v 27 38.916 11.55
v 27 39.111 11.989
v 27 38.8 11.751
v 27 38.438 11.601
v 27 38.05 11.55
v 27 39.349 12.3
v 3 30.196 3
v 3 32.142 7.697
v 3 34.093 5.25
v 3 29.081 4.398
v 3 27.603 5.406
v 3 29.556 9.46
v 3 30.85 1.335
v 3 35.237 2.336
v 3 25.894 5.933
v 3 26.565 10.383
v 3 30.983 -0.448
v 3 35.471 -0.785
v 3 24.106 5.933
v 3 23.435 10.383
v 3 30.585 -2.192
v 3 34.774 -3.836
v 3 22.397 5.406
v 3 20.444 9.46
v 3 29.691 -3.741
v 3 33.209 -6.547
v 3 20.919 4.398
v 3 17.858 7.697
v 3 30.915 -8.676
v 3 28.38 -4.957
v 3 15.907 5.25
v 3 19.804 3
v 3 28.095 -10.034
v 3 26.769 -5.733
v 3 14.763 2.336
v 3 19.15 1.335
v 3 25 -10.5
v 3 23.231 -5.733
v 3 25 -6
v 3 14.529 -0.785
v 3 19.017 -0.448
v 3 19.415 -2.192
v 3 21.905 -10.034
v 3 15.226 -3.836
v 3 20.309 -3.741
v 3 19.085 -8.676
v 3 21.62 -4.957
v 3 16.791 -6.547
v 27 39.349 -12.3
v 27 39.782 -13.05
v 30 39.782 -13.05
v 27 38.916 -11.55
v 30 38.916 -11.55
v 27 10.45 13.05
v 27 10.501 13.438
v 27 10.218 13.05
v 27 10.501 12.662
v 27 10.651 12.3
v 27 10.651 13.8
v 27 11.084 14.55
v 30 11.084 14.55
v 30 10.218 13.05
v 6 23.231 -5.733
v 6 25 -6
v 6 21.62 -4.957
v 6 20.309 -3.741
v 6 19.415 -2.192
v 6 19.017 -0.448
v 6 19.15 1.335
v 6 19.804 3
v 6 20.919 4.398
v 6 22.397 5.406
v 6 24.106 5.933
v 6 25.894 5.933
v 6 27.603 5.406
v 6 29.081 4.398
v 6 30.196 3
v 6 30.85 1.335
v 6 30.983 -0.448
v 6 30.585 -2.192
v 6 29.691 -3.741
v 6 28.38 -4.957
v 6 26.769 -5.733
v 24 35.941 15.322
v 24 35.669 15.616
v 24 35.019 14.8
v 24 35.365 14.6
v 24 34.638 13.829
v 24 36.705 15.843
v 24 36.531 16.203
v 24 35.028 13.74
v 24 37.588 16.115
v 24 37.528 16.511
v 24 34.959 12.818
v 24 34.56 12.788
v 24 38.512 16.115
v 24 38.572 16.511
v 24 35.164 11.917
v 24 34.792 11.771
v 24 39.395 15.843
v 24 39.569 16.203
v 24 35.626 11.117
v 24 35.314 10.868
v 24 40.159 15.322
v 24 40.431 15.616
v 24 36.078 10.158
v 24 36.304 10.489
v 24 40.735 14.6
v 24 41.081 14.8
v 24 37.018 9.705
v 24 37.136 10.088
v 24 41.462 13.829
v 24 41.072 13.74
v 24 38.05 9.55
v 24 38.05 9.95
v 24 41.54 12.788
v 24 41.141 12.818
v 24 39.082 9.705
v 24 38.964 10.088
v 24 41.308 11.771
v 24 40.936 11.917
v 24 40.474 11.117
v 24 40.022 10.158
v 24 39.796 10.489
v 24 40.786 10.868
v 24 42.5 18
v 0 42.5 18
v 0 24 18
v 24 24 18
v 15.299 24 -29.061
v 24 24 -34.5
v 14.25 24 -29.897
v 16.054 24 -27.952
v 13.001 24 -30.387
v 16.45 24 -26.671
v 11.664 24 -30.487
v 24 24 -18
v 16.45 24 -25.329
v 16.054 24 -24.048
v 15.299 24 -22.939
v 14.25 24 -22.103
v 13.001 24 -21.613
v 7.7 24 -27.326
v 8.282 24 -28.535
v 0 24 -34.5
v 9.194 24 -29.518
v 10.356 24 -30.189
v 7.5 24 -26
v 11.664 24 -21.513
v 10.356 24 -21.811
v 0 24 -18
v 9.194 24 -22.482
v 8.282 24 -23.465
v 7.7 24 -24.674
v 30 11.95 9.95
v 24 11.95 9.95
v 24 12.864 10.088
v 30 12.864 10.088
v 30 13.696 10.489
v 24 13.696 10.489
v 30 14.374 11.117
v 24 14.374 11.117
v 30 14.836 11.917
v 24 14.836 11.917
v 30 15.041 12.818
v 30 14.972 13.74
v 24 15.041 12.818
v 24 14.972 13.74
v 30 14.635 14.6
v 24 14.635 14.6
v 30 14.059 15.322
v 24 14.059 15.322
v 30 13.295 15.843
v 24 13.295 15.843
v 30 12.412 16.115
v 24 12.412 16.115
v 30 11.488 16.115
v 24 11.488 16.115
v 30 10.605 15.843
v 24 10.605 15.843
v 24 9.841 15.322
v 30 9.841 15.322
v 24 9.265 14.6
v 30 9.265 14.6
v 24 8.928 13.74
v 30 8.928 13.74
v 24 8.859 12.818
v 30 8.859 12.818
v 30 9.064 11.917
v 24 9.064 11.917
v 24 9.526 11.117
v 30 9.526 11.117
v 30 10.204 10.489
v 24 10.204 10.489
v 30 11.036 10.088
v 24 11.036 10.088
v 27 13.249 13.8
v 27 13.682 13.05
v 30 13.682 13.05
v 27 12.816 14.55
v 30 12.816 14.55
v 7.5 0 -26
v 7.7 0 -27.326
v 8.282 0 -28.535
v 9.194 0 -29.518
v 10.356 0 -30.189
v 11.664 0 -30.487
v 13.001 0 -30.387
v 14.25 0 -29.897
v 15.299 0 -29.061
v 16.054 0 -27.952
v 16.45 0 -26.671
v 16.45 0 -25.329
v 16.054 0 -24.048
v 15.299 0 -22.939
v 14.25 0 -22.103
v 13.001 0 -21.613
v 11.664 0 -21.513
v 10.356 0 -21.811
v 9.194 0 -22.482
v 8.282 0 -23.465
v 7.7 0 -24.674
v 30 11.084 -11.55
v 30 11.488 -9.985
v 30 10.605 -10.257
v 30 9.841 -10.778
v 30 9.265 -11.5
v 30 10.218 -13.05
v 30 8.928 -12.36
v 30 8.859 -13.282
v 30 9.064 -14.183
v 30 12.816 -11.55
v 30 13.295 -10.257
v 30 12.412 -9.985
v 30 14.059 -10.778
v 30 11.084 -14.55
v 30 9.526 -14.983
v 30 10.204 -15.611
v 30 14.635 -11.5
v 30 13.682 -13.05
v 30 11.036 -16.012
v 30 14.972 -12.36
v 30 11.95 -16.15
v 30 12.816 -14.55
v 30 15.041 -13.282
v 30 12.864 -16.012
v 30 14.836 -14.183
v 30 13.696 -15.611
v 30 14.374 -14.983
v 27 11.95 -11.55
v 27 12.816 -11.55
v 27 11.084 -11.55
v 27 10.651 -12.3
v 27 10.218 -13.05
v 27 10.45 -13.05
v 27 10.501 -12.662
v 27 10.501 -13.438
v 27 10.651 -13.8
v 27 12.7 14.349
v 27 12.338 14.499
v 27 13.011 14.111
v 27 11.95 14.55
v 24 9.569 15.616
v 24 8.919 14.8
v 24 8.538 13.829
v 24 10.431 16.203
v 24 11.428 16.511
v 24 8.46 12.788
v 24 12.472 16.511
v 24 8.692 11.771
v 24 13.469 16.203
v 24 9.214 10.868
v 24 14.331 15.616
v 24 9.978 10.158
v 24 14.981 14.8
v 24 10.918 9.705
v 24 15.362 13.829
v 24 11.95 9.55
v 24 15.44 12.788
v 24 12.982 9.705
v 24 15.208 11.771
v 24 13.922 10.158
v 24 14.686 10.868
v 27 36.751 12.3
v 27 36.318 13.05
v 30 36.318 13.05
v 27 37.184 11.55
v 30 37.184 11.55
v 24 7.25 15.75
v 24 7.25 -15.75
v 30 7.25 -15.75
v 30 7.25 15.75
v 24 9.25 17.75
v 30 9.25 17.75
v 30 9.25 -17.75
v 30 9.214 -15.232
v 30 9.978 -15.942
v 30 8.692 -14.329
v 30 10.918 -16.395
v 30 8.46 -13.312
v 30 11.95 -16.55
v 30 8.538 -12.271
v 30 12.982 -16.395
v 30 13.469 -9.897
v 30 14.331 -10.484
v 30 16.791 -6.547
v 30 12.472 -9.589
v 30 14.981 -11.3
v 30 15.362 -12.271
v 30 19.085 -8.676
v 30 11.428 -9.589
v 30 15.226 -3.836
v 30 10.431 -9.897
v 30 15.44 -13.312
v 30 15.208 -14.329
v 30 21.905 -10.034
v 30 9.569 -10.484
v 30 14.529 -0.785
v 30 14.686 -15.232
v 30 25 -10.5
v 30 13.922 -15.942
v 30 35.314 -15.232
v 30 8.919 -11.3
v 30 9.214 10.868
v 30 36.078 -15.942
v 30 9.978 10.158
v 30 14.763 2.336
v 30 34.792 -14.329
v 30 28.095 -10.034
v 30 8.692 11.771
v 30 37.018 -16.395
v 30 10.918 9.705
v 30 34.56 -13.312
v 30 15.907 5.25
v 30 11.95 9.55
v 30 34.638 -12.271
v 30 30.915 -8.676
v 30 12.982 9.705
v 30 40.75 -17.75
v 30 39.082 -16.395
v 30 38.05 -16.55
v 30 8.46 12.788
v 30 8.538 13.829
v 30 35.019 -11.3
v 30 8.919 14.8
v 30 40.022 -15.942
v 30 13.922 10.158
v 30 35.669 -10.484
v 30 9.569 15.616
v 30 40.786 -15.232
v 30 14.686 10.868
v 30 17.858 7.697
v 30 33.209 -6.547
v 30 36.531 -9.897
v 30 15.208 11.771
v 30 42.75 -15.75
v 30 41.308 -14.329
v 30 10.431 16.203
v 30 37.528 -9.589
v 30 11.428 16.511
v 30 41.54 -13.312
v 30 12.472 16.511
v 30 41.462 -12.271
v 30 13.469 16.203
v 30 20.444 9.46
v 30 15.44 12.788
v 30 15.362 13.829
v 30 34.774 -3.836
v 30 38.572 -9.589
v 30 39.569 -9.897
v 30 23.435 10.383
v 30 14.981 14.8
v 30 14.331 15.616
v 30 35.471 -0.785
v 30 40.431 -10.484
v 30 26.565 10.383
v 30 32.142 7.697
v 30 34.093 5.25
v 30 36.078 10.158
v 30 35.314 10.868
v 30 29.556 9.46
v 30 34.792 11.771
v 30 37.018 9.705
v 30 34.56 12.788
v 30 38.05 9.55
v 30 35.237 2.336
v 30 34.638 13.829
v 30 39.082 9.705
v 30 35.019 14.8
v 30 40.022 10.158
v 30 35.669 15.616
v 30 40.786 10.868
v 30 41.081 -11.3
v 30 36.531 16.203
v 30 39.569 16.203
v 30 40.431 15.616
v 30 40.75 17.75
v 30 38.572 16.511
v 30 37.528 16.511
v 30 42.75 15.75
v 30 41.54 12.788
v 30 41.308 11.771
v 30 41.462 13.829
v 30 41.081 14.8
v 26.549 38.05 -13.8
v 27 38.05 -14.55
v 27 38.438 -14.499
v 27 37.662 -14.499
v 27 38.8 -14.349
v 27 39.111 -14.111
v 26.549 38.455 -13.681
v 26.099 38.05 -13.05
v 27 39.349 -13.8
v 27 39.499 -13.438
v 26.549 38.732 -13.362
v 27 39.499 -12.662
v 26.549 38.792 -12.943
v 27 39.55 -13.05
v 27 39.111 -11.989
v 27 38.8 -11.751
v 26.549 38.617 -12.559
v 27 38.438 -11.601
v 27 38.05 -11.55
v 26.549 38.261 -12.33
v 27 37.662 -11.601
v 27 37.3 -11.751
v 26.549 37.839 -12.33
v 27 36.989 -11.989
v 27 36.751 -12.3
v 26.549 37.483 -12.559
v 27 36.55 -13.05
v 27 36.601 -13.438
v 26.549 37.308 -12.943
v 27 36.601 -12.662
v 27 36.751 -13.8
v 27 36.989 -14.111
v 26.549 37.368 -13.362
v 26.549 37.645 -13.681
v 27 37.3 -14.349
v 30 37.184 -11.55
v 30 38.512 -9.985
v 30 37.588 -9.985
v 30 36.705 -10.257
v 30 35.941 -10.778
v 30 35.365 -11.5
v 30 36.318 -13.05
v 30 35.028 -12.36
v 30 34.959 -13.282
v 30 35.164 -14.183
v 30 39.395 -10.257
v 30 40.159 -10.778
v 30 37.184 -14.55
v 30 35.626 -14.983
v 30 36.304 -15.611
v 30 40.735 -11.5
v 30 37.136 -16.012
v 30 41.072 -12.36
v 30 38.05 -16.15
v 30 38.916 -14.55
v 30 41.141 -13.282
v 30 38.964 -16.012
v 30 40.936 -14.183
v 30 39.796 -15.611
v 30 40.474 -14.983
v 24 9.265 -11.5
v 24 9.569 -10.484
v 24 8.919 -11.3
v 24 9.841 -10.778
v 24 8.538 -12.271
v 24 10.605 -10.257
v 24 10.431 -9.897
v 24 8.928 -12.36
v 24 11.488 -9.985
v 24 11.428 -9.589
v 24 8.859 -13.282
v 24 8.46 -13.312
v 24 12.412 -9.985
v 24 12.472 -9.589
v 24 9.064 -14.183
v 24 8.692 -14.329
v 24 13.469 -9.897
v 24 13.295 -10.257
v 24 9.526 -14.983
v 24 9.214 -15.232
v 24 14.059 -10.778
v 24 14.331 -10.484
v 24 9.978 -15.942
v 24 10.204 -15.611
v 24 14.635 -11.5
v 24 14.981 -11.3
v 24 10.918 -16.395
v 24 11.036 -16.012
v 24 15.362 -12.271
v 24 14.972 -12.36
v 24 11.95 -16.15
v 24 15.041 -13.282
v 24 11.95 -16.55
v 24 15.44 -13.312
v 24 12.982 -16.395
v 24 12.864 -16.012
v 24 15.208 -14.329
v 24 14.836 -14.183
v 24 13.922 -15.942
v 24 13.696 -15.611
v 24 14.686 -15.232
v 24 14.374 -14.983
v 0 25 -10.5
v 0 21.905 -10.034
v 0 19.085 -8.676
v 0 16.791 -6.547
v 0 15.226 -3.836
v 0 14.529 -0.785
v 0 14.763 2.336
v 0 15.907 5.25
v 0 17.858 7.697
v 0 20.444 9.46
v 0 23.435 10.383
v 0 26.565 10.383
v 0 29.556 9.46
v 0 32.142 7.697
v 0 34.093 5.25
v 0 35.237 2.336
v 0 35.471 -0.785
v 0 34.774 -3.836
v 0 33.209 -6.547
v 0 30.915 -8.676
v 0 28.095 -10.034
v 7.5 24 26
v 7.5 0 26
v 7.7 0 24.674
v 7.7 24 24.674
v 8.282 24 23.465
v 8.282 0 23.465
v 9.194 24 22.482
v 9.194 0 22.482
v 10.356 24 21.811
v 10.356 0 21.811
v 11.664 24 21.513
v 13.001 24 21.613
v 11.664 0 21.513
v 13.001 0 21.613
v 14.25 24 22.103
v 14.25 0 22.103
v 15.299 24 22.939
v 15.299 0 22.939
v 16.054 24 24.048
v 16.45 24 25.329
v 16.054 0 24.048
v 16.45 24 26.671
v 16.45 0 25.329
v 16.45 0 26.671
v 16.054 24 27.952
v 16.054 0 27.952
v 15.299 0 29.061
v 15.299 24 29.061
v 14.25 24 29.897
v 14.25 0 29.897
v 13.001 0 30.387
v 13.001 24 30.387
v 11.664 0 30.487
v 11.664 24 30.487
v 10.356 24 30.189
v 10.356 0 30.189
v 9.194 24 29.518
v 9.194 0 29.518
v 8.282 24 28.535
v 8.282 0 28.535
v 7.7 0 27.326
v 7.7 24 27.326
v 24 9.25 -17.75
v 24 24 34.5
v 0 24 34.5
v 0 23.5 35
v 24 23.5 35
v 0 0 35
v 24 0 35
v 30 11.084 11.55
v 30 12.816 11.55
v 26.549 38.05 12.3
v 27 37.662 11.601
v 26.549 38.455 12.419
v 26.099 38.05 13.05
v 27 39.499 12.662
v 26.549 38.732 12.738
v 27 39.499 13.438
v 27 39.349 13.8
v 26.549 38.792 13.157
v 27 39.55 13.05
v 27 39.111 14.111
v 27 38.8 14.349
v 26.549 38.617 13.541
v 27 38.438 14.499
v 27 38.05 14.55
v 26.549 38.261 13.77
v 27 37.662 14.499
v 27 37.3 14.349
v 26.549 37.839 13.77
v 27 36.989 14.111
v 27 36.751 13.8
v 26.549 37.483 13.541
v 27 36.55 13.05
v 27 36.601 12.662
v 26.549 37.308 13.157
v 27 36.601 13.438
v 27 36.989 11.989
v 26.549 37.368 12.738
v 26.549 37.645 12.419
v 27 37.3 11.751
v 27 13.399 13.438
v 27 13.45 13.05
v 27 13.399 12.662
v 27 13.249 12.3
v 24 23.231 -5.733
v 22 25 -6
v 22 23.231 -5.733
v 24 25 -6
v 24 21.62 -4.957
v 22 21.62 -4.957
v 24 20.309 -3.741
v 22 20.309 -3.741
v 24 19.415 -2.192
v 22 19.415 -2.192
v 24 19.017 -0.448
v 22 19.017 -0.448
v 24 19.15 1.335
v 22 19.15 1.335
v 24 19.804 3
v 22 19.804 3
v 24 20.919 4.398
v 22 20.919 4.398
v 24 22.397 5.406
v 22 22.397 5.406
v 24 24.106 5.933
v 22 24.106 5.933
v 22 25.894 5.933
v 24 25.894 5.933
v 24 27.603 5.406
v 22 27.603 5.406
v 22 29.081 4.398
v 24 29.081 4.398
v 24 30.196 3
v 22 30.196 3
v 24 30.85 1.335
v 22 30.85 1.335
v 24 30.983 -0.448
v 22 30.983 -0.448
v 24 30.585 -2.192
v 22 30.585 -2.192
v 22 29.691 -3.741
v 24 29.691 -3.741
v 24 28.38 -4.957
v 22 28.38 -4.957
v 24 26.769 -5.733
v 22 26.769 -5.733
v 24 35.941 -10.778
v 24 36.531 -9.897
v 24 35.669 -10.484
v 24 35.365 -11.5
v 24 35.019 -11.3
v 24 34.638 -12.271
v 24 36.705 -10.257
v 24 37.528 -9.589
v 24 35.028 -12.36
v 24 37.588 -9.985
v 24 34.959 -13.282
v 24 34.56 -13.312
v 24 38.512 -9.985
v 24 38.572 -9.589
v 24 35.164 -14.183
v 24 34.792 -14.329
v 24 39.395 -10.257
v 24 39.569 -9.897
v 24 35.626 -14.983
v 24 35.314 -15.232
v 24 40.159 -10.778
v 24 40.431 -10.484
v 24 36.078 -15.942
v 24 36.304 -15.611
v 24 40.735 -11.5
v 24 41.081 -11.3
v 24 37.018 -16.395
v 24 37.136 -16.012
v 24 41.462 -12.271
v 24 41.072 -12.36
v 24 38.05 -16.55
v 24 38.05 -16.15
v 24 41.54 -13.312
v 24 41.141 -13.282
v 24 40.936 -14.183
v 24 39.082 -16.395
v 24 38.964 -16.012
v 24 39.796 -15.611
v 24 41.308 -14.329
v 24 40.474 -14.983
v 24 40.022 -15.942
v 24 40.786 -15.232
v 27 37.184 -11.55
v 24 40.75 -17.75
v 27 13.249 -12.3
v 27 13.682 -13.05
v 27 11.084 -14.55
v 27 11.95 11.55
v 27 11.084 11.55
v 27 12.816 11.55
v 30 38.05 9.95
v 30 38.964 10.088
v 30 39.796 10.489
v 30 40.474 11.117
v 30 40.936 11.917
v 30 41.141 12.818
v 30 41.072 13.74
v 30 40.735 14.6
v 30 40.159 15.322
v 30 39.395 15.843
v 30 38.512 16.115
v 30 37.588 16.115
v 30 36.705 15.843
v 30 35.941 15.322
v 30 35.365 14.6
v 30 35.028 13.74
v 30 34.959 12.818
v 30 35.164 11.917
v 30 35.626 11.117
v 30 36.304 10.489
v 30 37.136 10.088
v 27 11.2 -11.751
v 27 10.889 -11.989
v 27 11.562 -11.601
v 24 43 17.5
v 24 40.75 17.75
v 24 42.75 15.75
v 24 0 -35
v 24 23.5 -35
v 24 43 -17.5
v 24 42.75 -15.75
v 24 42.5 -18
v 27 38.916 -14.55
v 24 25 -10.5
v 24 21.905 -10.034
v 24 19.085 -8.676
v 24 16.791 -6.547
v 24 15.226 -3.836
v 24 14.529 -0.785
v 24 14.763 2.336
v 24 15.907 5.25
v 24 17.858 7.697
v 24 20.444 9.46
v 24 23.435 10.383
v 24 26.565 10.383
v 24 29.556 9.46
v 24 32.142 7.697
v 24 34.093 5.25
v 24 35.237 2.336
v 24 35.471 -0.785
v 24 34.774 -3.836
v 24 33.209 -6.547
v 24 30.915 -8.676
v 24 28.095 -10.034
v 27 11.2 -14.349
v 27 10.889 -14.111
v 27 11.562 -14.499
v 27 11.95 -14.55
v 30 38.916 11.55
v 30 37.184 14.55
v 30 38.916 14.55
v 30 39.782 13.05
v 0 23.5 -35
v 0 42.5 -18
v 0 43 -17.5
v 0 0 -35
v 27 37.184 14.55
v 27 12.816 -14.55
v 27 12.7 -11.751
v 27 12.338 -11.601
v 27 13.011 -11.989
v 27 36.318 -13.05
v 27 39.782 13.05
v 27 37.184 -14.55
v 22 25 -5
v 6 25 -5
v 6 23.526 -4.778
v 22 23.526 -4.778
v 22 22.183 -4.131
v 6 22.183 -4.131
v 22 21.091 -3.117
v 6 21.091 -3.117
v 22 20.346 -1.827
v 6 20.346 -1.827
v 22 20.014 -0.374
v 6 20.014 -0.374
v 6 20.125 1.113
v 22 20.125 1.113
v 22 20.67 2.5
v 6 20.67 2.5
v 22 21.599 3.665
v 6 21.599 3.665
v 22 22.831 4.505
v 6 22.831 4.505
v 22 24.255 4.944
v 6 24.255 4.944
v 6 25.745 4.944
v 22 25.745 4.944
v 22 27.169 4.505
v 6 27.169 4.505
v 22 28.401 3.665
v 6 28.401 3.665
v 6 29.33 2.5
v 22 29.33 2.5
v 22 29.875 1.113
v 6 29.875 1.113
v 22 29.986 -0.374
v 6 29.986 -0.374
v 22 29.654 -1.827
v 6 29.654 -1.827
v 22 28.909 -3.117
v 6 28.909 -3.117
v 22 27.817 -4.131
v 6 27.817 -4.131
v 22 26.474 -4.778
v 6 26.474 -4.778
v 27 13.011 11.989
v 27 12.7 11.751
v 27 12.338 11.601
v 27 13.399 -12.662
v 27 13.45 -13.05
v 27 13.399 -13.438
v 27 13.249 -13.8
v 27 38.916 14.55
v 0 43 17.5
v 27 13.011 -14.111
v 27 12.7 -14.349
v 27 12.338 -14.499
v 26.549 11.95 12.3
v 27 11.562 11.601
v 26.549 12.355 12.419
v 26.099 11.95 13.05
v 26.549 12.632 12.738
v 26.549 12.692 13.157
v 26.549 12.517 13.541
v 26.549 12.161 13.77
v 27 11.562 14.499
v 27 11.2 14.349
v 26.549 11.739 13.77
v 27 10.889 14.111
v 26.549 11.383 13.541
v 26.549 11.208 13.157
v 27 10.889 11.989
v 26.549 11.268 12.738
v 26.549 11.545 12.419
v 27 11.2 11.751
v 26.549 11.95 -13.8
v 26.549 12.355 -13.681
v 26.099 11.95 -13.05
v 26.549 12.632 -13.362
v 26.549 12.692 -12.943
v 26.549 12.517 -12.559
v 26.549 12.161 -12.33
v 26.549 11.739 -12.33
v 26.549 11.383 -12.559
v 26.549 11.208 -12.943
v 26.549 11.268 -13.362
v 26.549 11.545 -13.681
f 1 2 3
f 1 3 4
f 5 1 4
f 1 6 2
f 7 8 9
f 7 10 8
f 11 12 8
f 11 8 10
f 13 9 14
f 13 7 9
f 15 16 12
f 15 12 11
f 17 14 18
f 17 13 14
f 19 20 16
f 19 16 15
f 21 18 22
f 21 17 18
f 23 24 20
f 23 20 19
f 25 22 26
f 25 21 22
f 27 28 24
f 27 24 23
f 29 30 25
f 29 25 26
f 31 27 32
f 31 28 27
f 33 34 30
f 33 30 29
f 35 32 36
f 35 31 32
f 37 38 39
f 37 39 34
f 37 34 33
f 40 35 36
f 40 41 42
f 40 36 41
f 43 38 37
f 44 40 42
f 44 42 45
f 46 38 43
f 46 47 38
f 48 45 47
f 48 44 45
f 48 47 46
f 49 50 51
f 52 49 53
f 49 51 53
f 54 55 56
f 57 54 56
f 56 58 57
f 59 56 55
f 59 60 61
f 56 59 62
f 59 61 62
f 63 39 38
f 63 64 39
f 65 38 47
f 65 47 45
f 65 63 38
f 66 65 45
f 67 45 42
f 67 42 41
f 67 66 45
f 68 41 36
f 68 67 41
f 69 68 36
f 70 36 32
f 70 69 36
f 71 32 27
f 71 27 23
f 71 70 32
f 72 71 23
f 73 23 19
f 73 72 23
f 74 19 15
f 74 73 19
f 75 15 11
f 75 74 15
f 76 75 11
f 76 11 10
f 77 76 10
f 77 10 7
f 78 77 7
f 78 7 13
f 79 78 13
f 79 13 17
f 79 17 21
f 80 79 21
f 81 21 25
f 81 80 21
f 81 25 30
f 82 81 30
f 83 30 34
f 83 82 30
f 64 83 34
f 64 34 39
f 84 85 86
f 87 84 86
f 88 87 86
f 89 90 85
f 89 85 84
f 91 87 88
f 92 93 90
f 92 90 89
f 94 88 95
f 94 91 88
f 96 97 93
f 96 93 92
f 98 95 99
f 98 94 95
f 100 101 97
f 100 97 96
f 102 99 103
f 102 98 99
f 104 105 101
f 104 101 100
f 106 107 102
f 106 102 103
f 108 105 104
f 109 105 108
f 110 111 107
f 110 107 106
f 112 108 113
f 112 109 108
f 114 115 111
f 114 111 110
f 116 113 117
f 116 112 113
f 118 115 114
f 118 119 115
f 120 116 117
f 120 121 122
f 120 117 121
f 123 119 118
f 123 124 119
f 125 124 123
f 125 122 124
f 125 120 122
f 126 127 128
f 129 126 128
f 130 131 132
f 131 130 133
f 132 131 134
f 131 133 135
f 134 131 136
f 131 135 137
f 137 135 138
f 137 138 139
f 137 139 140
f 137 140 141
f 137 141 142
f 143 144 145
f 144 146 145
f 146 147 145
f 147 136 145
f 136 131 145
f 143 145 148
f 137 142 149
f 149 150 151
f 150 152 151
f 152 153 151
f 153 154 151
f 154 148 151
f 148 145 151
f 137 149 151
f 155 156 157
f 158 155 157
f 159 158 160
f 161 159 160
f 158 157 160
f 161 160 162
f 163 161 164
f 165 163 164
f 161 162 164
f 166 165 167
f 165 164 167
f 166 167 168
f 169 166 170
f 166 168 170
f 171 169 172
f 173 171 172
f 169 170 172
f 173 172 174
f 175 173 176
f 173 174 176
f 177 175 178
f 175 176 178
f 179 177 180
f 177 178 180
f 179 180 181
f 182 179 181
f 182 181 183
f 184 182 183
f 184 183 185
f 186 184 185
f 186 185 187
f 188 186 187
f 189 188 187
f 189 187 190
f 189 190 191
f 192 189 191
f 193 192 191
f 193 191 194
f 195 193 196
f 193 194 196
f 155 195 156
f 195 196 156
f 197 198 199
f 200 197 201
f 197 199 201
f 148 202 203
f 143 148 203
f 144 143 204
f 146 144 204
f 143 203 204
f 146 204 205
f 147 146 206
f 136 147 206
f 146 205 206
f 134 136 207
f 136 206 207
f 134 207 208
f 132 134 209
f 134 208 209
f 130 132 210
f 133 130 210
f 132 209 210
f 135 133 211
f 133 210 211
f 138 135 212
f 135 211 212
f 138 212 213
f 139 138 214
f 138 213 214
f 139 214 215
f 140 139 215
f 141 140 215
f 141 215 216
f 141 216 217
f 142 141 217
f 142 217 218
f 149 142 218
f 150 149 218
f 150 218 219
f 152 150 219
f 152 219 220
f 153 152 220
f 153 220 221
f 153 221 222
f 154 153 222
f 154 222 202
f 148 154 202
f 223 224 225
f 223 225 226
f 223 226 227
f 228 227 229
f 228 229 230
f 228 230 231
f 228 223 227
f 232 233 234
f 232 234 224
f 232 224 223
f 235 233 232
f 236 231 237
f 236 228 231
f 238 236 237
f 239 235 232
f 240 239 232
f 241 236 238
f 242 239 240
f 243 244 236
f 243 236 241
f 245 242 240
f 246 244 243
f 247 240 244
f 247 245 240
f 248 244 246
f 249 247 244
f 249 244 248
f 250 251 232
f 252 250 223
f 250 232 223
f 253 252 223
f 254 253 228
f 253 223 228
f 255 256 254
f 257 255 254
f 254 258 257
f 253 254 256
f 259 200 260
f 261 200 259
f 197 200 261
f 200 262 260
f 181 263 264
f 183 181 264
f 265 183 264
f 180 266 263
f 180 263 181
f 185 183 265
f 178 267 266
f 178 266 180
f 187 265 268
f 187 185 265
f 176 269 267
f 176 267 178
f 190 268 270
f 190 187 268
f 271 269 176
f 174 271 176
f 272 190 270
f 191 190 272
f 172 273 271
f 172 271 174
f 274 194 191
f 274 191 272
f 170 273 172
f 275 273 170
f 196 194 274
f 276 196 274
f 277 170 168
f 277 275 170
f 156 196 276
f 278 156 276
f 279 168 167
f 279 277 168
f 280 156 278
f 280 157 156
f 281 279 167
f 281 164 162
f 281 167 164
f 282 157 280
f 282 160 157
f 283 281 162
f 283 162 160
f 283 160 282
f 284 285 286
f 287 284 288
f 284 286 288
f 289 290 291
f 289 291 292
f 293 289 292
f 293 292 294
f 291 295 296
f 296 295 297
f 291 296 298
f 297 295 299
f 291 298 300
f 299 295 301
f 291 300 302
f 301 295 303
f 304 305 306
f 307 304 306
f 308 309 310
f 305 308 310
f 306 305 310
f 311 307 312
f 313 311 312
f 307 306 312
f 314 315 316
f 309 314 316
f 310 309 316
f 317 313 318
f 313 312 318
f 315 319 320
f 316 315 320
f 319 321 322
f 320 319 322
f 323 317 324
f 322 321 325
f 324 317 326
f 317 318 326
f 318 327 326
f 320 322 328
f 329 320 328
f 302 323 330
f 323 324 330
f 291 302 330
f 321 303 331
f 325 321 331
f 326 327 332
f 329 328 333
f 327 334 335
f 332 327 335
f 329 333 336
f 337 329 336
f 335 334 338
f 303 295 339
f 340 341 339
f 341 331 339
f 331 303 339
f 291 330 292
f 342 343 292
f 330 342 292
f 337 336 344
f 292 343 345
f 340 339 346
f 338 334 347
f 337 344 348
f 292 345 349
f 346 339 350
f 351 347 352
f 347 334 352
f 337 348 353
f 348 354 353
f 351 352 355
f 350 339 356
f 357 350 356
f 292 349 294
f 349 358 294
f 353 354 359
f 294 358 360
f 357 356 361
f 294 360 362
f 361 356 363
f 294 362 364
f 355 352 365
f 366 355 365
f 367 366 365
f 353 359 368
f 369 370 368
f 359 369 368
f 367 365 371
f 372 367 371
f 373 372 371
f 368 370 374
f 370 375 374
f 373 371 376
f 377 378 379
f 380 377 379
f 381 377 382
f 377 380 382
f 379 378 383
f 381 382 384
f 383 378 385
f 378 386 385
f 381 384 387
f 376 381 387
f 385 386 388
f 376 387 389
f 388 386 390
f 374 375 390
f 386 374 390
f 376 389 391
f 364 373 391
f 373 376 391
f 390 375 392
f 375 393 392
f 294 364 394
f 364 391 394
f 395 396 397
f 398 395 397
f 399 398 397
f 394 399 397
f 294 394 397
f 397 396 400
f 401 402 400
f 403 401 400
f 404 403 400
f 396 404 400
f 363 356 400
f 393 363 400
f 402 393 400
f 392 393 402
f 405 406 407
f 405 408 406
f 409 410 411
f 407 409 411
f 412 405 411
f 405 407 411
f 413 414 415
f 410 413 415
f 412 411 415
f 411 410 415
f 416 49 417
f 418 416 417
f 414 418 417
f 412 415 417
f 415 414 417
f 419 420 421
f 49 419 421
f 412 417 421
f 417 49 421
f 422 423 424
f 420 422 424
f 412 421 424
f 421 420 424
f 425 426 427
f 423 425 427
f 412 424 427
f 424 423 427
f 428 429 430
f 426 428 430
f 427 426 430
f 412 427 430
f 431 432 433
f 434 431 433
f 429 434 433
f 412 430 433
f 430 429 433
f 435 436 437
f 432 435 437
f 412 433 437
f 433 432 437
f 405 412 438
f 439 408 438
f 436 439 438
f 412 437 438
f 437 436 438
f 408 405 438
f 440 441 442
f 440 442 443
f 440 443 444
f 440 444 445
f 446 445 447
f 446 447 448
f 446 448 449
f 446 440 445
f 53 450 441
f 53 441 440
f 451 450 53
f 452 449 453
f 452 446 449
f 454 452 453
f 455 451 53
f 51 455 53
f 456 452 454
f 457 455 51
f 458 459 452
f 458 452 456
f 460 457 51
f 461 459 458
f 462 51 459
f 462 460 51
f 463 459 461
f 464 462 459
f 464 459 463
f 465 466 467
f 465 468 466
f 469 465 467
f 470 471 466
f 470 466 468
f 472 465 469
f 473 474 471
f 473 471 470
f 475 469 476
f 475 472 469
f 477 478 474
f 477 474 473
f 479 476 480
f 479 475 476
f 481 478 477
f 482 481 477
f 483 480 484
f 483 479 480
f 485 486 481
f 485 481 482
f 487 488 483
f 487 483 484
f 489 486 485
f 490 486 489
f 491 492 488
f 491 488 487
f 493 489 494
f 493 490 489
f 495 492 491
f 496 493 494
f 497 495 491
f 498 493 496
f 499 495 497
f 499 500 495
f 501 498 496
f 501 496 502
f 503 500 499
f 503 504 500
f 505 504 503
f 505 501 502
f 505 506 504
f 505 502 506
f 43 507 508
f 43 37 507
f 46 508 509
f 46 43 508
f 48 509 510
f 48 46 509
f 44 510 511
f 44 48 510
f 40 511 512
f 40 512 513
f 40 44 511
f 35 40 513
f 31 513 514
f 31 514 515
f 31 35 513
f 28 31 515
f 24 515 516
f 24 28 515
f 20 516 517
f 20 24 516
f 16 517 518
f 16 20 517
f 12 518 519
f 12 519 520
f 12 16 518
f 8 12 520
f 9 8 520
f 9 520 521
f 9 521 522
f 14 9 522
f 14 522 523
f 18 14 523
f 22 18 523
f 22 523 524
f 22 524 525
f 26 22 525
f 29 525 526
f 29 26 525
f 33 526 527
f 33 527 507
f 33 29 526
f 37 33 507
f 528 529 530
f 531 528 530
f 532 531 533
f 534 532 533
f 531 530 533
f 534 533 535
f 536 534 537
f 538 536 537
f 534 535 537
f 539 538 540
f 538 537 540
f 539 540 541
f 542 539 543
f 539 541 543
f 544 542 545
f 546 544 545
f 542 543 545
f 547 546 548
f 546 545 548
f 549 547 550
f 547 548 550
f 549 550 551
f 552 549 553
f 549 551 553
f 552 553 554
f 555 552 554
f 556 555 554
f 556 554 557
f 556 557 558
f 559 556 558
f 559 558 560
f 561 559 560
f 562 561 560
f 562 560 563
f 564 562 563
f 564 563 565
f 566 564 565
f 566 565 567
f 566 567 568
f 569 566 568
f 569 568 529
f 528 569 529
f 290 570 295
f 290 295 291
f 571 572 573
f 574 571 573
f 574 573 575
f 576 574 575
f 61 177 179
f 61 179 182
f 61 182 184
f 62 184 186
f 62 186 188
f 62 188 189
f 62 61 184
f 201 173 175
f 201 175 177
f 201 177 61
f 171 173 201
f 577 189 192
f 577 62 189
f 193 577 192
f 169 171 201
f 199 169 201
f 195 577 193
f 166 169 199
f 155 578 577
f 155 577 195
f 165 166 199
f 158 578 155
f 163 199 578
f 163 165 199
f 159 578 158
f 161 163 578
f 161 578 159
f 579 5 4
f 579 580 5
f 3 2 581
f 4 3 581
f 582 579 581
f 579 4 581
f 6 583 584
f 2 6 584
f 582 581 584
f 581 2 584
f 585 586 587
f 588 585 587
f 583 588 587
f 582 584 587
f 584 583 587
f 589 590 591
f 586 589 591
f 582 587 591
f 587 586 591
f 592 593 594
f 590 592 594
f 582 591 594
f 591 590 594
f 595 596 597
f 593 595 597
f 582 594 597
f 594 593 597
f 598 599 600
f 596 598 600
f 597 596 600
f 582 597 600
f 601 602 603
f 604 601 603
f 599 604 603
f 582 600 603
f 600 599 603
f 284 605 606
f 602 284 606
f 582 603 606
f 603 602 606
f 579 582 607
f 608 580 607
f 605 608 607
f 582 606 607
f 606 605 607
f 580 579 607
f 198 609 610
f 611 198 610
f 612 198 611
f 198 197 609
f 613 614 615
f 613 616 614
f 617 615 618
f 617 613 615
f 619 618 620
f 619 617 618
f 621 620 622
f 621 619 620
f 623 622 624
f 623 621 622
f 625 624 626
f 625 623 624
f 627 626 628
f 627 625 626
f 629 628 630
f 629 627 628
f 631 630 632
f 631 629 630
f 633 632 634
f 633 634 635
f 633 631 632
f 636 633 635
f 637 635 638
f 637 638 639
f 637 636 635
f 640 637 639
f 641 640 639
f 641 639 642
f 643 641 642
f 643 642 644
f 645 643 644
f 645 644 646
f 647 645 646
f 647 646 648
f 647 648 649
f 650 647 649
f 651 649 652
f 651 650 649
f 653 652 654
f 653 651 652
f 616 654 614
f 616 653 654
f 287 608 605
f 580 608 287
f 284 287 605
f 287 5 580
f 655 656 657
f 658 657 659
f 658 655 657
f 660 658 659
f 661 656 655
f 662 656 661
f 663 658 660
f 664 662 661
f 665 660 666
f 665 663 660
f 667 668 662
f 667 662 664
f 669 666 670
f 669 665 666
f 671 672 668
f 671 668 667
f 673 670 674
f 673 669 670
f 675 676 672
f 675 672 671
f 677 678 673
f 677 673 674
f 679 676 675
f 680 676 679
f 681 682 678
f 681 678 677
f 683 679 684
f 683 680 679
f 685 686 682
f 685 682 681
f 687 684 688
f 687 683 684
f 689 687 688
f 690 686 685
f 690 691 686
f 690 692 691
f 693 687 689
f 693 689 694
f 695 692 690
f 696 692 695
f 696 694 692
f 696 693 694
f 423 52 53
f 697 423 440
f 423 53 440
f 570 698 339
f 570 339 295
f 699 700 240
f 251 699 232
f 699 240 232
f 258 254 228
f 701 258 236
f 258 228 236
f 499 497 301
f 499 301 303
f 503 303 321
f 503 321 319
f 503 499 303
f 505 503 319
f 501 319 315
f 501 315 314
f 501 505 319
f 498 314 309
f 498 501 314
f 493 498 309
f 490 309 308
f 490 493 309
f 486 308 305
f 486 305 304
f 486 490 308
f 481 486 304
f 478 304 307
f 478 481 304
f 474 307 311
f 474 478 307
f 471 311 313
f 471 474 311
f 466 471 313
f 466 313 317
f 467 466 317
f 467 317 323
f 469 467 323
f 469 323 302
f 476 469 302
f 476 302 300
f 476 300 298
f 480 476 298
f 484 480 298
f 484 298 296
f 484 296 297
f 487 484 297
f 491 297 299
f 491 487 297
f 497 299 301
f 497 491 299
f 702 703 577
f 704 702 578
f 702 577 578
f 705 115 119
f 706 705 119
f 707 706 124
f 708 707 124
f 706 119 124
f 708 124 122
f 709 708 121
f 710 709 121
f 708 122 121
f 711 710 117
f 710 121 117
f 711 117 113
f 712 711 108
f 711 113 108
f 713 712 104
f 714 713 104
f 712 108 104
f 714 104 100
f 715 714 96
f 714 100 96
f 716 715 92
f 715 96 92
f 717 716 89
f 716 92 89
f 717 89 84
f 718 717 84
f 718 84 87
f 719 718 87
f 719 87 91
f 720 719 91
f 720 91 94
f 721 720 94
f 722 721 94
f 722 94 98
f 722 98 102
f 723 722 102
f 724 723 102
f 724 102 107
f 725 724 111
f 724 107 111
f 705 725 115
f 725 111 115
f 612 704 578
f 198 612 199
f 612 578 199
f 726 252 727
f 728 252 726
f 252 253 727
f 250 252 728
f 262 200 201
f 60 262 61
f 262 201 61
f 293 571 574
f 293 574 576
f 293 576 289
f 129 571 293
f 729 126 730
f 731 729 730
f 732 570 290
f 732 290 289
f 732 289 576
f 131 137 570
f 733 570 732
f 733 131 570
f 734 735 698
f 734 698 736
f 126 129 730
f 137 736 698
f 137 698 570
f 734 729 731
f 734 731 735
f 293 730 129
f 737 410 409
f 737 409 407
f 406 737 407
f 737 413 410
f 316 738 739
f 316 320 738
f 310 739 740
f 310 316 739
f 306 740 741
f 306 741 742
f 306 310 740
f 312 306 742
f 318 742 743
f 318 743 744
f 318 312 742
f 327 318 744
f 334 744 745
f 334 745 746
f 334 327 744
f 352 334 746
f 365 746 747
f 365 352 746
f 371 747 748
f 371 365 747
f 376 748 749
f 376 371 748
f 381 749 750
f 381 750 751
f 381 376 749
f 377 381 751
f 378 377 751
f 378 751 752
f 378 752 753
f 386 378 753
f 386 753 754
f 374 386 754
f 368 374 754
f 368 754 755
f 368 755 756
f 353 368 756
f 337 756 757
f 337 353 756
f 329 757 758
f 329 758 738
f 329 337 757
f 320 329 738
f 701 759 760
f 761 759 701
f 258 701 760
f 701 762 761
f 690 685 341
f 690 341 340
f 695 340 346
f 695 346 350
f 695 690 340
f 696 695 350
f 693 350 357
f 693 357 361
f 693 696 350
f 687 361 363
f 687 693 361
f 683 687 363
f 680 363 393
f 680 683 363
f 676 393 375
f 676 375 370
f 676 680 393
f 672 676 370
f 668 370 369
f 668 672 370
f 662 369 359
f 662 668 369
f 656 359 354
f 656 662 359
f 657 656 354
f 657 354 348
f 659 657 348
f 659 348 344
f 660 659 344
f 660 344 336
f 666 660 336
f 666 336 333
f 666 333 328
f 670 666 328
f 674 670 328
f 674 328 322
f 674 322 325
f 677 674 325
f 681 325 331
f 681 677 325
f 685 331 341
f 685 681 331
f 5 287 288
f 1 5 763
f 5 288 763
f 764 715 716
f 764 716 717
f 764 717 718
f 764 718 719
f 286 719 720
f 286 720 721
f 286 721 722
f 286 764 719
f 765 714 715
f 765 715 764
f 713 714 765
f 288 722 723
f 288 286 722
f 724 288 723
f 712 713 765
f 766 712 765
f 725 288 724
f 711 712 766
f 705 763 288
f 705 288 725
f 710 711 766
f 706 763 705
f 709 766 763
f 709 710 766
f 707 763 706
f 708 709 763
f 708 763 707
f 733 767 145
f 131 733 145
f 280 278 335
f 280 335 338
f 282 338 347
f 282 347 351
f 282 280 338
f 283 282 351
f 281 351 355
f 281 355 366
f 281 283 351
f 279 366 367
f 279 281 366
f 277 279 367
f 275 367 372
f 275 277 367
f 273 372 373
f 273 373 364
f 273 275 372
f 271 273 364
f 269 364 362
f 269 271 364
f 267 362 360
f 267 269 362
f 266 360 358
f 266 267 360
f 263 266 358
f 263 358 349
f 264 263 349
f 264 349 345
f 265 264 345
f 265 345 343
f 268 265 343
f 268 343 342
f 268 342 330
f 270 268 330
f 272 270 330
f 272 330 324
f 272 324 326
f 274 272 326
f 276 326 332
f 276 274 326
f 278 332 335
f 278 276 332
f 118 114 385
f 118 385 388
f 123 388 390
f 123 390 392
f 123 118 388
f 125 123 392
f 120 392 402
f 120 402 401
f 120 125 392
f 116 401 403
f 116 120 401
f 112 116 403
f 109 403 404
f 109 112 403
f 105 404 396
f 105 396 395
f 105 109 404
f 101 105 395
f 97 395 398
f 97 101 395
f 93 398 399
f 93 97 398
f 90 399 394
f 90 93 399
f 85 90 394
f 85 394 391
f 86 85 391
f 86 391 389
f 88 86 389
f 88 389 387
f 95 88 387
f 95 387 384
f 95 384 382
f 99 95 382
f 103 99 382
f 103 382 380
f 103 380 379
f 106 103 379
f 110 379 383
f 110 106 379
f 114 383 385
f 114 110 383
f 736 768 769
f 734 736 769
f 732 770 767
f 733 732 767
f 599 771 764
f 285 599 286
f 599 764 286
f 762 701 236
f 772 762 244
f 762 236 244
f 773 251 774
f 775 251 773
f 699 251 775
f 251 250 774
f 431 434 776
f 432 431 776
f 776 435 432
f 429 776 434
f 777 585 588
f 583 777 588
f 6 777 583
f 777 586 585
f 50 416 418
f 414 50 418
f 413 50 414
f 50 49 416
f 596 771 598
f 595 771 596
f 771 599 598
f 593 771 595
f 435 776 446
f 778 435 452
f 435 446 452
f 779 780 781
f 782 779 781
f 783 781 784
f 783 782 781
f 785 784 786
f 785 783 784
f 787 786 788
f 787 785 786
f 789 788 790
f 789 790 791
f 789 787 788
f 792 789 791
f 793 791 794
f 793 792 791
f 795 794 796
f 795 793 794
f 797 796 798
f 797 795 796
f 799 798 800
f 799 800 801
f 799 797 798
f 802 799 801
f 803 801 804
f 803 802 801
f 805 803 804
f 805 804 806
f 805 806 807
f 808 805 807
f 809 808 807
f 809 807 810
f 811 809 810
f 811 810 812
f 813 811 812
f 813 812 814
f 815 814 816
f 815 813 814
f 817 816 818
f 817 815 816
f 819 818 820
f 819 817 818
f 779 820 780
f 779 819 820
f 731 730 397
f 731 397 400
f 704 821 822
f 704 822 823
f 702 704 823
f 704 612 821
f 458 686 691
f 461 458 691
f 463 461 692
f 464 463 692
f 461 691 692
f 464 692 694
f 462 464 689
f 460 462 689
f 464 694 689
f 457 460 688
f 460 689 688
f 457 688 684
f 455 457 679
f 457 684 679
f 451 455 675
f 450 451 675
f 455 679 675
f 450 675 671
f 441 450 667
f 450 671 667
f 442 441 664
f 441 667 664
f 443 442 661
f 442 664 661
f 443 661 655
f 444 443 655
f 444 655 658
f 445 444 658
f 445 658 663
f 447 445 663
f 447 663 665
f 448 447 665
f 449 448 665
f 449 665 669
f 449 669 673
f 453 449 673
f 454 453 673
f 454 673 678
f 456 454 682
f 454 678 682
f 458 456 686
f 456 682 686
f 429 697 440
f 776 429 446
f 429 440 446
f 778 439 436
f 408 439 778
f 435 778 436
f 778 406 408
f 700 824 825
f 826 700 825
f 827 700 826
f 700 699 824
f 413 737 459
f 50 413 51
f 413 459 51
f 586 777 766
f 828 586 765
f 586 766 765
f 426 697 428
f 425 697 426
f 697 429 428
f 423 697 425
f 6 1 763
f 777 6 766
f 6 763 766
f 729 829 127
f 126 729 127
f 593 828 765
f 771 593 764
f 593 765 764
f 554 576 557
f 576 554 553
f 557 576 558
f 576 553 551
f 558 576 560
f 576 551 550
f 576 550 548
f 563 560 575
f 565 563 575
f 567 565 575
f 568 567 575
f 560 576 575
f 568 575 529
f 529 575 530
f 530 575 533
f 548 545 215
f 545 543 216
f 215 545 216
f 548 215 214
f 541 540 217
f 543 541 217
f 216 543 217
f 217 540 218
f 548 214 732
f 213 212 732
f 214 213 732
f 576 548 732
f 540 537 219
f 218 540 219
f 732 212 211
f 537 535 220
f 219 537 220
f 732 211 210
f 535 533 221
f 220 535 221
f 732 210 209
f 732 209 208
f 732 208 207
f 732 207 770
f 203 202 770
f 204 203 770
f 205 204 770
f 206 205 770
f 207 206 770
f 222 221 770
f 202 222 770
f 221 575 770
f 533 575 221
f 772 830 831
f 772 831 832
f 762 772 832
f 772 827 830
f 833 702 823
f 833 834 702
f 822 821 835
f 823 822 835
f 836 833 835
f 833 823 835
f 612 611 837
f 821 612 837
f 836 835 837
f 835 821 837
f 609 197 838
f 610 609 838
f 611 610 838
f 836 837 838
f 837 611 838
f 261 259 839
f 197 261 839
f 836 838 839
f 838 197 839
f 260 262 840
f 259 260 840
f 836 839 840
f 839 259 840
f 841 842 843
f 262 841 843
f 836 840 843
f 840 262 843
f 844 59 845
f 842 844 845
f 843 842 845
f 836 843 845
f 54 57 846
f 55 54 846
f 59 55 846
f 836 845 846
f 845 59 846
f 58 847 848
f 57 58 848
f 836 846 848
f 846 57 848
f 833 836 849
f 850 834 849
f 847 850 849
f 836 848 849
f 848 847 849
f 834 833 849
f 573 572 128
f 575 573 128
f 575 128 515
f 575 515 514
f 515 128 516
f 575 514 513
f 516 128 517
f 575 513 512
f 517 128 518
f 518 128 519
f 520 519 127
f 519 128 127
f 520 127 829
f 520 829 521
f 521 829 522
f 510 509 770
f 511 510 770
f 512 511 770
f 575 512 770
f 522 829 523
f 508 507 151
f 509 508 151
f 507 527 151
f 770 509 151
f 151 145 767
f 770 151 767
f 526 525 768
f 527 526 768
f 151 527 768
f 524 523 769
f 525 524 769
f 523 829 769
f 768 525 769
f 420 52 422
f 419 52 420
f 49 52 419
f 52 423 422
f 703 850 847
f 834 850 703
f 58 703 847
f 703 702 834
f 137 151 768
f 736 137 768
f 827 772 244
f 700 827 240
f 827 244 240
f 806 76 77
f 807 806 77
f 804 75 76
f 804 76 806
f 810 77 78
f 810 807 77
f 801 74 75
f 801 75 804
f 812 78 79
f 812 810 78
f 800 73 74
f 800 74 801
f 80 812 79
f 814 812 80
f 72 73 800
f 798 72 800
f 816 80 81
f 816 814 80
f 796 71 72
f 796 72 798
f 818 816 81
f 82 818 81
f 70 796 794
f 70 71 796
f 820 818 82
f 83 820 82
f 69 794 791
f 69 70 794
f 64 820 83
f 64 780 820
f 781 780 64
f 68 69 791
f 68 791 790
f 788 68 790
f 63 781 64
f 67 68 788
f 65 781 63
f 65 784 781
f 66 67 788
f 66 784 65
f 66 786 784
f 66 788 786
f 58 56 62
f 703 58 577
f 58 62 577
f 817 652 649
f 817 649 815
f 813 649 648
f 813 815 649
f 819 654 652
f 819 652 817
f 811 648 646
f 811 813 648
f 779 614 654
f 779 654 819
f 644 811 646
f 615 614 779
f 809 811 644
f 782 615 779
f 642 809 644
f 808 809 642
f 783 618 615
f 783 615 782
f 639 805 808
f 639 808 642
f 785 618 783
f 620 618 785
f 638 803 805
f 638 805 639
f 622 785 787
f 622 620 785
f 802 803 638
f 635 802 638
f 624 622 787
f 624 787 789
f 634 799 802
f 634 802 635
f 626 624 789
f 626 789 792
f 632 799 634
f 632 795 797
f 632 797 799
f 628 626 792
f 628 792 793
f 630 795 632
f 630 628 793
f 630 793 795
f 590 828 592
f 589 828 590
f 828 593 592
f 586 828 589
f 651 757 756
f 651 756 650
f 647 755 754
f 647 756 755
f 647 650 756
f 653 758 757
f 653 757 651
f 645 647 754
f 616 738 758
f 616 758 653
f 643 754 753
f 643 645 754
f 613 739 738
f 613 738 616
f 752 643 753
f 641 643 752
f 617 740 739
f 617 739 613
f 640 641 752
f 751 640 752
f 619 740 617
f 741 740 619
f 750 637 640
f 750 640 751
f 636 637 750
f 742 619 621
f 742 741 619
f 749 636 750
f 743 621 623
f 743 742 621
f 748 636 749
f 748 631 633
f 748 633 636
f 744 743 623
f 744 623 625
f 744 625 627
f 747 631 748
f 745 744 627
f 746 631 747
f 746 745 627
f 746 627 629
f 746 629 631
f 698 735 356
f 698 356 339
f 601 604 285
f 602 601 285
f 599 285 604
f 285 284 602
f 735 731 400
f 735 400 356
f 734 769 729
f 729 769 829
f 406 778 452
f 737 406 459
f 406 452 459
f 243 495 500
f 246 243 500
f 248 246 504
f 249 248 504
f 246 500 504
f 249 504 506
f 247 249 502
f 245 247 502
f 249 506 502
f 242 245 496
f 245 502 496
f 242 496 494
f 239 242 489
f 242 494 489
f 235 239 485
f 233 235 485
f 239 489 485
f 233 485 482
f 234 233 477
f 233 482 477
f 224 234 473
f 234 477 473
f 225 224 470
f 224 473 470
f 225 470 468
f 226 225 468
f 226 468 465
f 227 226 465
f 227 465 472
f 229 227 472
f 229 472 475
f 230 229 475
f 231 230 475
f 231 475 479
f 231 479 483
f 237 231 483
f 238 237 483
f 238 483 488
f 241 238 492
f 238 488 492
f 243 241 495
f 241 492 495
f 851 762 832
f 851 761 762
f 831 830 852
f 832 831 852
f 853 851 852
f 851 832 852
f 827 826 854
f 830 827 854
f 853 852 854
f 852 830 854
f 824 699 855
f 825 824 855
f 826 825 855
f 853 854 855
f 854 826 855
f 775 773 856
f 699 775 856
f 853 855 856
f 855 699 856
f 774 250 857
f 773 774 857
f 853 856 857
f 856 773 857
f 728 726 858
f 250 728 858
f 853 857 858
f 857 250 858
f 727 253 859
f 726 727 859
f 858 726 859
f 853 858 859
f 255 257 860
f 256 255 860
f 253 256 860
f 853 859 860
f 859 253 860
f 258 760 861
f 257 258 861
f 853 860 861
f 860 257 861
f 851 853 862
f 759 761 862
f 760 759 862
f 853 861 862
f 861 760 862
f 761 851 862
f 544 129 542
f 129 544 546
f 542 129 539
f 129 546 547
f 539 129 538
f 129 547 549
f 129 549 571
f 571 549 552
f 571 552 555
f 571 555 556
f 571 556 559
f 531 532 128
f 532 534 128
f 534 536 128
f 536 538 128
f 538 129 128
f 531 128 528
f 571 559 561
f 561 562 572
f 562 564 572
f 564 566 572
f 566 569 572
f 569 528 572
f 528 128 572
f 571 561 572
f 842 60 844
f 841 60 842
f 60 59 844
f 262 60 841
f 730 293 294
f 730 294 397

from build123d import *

# Parameters (mm, degrees)
BOSS_EXTRUDE1_DEPTH = 24
SKETCH4_R           = 3.5
BOSS_EXTRUDE2_DEPTH = 6
SKETCH5_R           = 3.1
BOSS_EXTRUDE3_DEPTH = 6
DIAMETERHOLE1_D     = 3
DIAMETERHOLE1_DEPTH = 3
DIAMETERHOLE1_TIP   = 0.901290929
CUT_EXTRUDE1_DEPTH  = 3
DIAMETERHOLE3_D     = 9


with BuildPart() as part:
    # Sketch1 → Boss-Extrude1 (new body)
    with BuildSketch(Plane(origin=(0, 0, 0), x_dir=(0, 0, -1), z_dir=(1, 0, 0))):
        Polygon((-18, 42.5), (-18, 24), (-34.5, 24), (-35, 23.5), (-35, 0), (35, 0), (35, 23.5), (34.5, 24), (18, 24), (18, 42.5), (17.5, 43), (-17.5, 43), align=None)
    extrude(amount=BOSS_EXTRUDE1_DEPTH)

    # Sketch4 → Boss-Extrude2 (add)
    with BuildSketch(Plane(origin=(24, 0, 0), x_dir=(0, 0, -1), z_dir=(1, 0, 0))):
        Polygon((-17.75, 40.75), (-15.75, 42.75), (15.75, 42.75), (17.75, 40.75), (17.75, 9.25), (15.75, 7.25), (-15.75, 7.25), (-17.75, 9.25), align=None)
        with Locations((-13.05, 38.05)):
            Circle(SKETCH4_R, mode=Mode.SUBTRACT)
        with Locations((13.05, 38.05)):
            Circle(SKETCH4_R, mode=Mode.SUBTRACT)
        with Locations((-13.05, 11.95)):
            Circle(SKETCH4_R, mode=Mode.SUBTRACT)
        with Locations((13.05, 11.95)):
            Circle(SKETCH4_R, mode=Mode.SUBTRACT)
    extrude(amount=BOSS_EXTRUDE2_DEPTH)

    # Sketch5 → Boss-Extrude3 (add)
    with BuildSketch(Plane(origin=(24, 0, 0), x_dir=(0, 0, -1), z_dir=(1, 0, 0))):
        with Locations((-13.05, 38.05)):
            Circle(SKETCH5_R)
        with Locations((13.05, 38.05)):
            Circle(SKETCH5_R)
        with Locations((13.05, 11.95)):
            Circle(SKETCH5_R)
        with Locations((-13.05, 11.95)):
            Circle(SKETCH5_R)
    extrude(amount=BOSS_EXTRUDE3_DEPTH)

    # DiameterHole1
    with Locations(Plane(origin=(30, 0, 0), x_dir=(0, 0, -1), z_dir=(1, 0, 0))):
        with Locations((-13.05, 38.05), (13.05, 38.05), (-13.05, 11.95), (13.05, 11.95)):
            Hole(DIAMETERHOLE1_D / 2, depth=DIAMETERHOLE1_DEPTH)
            with Locations((0, 0, -(DIAMETERHOLE1_DEPTH + DIAMETERHOLE1_TIP / 2))):  # 118° drill point
                Cone(0, DIAMETERHOLE1_D / 2, DIAMETERHOLE1_TIP, mode=Mode.SUBTRACT)

    # Sketch8 → Cut-Extrude1 (cut)
    with BuildSketch(Plane(origin=(30, 0, 0), x_dir=(0, 0, -1), z_dir=(1, 0, 0))):
        Polygon((-13.05, 36.317949192), (-11.55, 37.183974596), (-11.55, 38.916025404), (-13.05, 39.782050808), (-14.55, 38.916025404), (-14.55, 37.183974596), align=None)
        Polygon((14.55, 37.183974596), (14.55, 38.916025404), (13.05, 39.782050808), (11.55, 38.916025404), (11.55, 37.183974596), (13.05, 36.317949192), align=None)
        Polygon((-11.55, 11.083974596), (-11.55, 12.816025404), (-13.05, 13.682050808), (-14.55, 12.816025404), (-14.55, 11.083974596), (-13.05, 10.217949192), align=None)
        Polygon((14.55, 11.083974596), (14.55, 12.816025404), (13.05, 13.682050808), (11.55, 12.816025404), (11.55, 11.083974596), (13.05, 10.217949192), align=None)
    extrude(amount=-CUT_EXTRUDE1_DEPTH, mode=Mode.SUBTRACT)

    # Sketch9 → Cut-Revolve1 (revolve, cut)
    with BuildSketch(Plane.XY):
        Polygon((0, 35.5), (3, 35.5), (3, 31), (6, 31), (6, 30), (22, 30), (22, 31), (24, 31), (24, 35.5), (30, 35.5), (30, 25), (0, 25), align=None)
    revolve(axis=Axis((30, 25, 0), (-1, 0, 0)), mode=Mode.SUBTRACT)

    # DiameterHole3 (through all)
    with Locations(Plane(origin=(0, 24, 0), x_dir=(1, 0, 0), z_dir=(0, 1, 0))):
        with Locations((12, -26), (12, 26)):
            Hole(DIAMETERHOLE3_D / 2)


solid = part.part
